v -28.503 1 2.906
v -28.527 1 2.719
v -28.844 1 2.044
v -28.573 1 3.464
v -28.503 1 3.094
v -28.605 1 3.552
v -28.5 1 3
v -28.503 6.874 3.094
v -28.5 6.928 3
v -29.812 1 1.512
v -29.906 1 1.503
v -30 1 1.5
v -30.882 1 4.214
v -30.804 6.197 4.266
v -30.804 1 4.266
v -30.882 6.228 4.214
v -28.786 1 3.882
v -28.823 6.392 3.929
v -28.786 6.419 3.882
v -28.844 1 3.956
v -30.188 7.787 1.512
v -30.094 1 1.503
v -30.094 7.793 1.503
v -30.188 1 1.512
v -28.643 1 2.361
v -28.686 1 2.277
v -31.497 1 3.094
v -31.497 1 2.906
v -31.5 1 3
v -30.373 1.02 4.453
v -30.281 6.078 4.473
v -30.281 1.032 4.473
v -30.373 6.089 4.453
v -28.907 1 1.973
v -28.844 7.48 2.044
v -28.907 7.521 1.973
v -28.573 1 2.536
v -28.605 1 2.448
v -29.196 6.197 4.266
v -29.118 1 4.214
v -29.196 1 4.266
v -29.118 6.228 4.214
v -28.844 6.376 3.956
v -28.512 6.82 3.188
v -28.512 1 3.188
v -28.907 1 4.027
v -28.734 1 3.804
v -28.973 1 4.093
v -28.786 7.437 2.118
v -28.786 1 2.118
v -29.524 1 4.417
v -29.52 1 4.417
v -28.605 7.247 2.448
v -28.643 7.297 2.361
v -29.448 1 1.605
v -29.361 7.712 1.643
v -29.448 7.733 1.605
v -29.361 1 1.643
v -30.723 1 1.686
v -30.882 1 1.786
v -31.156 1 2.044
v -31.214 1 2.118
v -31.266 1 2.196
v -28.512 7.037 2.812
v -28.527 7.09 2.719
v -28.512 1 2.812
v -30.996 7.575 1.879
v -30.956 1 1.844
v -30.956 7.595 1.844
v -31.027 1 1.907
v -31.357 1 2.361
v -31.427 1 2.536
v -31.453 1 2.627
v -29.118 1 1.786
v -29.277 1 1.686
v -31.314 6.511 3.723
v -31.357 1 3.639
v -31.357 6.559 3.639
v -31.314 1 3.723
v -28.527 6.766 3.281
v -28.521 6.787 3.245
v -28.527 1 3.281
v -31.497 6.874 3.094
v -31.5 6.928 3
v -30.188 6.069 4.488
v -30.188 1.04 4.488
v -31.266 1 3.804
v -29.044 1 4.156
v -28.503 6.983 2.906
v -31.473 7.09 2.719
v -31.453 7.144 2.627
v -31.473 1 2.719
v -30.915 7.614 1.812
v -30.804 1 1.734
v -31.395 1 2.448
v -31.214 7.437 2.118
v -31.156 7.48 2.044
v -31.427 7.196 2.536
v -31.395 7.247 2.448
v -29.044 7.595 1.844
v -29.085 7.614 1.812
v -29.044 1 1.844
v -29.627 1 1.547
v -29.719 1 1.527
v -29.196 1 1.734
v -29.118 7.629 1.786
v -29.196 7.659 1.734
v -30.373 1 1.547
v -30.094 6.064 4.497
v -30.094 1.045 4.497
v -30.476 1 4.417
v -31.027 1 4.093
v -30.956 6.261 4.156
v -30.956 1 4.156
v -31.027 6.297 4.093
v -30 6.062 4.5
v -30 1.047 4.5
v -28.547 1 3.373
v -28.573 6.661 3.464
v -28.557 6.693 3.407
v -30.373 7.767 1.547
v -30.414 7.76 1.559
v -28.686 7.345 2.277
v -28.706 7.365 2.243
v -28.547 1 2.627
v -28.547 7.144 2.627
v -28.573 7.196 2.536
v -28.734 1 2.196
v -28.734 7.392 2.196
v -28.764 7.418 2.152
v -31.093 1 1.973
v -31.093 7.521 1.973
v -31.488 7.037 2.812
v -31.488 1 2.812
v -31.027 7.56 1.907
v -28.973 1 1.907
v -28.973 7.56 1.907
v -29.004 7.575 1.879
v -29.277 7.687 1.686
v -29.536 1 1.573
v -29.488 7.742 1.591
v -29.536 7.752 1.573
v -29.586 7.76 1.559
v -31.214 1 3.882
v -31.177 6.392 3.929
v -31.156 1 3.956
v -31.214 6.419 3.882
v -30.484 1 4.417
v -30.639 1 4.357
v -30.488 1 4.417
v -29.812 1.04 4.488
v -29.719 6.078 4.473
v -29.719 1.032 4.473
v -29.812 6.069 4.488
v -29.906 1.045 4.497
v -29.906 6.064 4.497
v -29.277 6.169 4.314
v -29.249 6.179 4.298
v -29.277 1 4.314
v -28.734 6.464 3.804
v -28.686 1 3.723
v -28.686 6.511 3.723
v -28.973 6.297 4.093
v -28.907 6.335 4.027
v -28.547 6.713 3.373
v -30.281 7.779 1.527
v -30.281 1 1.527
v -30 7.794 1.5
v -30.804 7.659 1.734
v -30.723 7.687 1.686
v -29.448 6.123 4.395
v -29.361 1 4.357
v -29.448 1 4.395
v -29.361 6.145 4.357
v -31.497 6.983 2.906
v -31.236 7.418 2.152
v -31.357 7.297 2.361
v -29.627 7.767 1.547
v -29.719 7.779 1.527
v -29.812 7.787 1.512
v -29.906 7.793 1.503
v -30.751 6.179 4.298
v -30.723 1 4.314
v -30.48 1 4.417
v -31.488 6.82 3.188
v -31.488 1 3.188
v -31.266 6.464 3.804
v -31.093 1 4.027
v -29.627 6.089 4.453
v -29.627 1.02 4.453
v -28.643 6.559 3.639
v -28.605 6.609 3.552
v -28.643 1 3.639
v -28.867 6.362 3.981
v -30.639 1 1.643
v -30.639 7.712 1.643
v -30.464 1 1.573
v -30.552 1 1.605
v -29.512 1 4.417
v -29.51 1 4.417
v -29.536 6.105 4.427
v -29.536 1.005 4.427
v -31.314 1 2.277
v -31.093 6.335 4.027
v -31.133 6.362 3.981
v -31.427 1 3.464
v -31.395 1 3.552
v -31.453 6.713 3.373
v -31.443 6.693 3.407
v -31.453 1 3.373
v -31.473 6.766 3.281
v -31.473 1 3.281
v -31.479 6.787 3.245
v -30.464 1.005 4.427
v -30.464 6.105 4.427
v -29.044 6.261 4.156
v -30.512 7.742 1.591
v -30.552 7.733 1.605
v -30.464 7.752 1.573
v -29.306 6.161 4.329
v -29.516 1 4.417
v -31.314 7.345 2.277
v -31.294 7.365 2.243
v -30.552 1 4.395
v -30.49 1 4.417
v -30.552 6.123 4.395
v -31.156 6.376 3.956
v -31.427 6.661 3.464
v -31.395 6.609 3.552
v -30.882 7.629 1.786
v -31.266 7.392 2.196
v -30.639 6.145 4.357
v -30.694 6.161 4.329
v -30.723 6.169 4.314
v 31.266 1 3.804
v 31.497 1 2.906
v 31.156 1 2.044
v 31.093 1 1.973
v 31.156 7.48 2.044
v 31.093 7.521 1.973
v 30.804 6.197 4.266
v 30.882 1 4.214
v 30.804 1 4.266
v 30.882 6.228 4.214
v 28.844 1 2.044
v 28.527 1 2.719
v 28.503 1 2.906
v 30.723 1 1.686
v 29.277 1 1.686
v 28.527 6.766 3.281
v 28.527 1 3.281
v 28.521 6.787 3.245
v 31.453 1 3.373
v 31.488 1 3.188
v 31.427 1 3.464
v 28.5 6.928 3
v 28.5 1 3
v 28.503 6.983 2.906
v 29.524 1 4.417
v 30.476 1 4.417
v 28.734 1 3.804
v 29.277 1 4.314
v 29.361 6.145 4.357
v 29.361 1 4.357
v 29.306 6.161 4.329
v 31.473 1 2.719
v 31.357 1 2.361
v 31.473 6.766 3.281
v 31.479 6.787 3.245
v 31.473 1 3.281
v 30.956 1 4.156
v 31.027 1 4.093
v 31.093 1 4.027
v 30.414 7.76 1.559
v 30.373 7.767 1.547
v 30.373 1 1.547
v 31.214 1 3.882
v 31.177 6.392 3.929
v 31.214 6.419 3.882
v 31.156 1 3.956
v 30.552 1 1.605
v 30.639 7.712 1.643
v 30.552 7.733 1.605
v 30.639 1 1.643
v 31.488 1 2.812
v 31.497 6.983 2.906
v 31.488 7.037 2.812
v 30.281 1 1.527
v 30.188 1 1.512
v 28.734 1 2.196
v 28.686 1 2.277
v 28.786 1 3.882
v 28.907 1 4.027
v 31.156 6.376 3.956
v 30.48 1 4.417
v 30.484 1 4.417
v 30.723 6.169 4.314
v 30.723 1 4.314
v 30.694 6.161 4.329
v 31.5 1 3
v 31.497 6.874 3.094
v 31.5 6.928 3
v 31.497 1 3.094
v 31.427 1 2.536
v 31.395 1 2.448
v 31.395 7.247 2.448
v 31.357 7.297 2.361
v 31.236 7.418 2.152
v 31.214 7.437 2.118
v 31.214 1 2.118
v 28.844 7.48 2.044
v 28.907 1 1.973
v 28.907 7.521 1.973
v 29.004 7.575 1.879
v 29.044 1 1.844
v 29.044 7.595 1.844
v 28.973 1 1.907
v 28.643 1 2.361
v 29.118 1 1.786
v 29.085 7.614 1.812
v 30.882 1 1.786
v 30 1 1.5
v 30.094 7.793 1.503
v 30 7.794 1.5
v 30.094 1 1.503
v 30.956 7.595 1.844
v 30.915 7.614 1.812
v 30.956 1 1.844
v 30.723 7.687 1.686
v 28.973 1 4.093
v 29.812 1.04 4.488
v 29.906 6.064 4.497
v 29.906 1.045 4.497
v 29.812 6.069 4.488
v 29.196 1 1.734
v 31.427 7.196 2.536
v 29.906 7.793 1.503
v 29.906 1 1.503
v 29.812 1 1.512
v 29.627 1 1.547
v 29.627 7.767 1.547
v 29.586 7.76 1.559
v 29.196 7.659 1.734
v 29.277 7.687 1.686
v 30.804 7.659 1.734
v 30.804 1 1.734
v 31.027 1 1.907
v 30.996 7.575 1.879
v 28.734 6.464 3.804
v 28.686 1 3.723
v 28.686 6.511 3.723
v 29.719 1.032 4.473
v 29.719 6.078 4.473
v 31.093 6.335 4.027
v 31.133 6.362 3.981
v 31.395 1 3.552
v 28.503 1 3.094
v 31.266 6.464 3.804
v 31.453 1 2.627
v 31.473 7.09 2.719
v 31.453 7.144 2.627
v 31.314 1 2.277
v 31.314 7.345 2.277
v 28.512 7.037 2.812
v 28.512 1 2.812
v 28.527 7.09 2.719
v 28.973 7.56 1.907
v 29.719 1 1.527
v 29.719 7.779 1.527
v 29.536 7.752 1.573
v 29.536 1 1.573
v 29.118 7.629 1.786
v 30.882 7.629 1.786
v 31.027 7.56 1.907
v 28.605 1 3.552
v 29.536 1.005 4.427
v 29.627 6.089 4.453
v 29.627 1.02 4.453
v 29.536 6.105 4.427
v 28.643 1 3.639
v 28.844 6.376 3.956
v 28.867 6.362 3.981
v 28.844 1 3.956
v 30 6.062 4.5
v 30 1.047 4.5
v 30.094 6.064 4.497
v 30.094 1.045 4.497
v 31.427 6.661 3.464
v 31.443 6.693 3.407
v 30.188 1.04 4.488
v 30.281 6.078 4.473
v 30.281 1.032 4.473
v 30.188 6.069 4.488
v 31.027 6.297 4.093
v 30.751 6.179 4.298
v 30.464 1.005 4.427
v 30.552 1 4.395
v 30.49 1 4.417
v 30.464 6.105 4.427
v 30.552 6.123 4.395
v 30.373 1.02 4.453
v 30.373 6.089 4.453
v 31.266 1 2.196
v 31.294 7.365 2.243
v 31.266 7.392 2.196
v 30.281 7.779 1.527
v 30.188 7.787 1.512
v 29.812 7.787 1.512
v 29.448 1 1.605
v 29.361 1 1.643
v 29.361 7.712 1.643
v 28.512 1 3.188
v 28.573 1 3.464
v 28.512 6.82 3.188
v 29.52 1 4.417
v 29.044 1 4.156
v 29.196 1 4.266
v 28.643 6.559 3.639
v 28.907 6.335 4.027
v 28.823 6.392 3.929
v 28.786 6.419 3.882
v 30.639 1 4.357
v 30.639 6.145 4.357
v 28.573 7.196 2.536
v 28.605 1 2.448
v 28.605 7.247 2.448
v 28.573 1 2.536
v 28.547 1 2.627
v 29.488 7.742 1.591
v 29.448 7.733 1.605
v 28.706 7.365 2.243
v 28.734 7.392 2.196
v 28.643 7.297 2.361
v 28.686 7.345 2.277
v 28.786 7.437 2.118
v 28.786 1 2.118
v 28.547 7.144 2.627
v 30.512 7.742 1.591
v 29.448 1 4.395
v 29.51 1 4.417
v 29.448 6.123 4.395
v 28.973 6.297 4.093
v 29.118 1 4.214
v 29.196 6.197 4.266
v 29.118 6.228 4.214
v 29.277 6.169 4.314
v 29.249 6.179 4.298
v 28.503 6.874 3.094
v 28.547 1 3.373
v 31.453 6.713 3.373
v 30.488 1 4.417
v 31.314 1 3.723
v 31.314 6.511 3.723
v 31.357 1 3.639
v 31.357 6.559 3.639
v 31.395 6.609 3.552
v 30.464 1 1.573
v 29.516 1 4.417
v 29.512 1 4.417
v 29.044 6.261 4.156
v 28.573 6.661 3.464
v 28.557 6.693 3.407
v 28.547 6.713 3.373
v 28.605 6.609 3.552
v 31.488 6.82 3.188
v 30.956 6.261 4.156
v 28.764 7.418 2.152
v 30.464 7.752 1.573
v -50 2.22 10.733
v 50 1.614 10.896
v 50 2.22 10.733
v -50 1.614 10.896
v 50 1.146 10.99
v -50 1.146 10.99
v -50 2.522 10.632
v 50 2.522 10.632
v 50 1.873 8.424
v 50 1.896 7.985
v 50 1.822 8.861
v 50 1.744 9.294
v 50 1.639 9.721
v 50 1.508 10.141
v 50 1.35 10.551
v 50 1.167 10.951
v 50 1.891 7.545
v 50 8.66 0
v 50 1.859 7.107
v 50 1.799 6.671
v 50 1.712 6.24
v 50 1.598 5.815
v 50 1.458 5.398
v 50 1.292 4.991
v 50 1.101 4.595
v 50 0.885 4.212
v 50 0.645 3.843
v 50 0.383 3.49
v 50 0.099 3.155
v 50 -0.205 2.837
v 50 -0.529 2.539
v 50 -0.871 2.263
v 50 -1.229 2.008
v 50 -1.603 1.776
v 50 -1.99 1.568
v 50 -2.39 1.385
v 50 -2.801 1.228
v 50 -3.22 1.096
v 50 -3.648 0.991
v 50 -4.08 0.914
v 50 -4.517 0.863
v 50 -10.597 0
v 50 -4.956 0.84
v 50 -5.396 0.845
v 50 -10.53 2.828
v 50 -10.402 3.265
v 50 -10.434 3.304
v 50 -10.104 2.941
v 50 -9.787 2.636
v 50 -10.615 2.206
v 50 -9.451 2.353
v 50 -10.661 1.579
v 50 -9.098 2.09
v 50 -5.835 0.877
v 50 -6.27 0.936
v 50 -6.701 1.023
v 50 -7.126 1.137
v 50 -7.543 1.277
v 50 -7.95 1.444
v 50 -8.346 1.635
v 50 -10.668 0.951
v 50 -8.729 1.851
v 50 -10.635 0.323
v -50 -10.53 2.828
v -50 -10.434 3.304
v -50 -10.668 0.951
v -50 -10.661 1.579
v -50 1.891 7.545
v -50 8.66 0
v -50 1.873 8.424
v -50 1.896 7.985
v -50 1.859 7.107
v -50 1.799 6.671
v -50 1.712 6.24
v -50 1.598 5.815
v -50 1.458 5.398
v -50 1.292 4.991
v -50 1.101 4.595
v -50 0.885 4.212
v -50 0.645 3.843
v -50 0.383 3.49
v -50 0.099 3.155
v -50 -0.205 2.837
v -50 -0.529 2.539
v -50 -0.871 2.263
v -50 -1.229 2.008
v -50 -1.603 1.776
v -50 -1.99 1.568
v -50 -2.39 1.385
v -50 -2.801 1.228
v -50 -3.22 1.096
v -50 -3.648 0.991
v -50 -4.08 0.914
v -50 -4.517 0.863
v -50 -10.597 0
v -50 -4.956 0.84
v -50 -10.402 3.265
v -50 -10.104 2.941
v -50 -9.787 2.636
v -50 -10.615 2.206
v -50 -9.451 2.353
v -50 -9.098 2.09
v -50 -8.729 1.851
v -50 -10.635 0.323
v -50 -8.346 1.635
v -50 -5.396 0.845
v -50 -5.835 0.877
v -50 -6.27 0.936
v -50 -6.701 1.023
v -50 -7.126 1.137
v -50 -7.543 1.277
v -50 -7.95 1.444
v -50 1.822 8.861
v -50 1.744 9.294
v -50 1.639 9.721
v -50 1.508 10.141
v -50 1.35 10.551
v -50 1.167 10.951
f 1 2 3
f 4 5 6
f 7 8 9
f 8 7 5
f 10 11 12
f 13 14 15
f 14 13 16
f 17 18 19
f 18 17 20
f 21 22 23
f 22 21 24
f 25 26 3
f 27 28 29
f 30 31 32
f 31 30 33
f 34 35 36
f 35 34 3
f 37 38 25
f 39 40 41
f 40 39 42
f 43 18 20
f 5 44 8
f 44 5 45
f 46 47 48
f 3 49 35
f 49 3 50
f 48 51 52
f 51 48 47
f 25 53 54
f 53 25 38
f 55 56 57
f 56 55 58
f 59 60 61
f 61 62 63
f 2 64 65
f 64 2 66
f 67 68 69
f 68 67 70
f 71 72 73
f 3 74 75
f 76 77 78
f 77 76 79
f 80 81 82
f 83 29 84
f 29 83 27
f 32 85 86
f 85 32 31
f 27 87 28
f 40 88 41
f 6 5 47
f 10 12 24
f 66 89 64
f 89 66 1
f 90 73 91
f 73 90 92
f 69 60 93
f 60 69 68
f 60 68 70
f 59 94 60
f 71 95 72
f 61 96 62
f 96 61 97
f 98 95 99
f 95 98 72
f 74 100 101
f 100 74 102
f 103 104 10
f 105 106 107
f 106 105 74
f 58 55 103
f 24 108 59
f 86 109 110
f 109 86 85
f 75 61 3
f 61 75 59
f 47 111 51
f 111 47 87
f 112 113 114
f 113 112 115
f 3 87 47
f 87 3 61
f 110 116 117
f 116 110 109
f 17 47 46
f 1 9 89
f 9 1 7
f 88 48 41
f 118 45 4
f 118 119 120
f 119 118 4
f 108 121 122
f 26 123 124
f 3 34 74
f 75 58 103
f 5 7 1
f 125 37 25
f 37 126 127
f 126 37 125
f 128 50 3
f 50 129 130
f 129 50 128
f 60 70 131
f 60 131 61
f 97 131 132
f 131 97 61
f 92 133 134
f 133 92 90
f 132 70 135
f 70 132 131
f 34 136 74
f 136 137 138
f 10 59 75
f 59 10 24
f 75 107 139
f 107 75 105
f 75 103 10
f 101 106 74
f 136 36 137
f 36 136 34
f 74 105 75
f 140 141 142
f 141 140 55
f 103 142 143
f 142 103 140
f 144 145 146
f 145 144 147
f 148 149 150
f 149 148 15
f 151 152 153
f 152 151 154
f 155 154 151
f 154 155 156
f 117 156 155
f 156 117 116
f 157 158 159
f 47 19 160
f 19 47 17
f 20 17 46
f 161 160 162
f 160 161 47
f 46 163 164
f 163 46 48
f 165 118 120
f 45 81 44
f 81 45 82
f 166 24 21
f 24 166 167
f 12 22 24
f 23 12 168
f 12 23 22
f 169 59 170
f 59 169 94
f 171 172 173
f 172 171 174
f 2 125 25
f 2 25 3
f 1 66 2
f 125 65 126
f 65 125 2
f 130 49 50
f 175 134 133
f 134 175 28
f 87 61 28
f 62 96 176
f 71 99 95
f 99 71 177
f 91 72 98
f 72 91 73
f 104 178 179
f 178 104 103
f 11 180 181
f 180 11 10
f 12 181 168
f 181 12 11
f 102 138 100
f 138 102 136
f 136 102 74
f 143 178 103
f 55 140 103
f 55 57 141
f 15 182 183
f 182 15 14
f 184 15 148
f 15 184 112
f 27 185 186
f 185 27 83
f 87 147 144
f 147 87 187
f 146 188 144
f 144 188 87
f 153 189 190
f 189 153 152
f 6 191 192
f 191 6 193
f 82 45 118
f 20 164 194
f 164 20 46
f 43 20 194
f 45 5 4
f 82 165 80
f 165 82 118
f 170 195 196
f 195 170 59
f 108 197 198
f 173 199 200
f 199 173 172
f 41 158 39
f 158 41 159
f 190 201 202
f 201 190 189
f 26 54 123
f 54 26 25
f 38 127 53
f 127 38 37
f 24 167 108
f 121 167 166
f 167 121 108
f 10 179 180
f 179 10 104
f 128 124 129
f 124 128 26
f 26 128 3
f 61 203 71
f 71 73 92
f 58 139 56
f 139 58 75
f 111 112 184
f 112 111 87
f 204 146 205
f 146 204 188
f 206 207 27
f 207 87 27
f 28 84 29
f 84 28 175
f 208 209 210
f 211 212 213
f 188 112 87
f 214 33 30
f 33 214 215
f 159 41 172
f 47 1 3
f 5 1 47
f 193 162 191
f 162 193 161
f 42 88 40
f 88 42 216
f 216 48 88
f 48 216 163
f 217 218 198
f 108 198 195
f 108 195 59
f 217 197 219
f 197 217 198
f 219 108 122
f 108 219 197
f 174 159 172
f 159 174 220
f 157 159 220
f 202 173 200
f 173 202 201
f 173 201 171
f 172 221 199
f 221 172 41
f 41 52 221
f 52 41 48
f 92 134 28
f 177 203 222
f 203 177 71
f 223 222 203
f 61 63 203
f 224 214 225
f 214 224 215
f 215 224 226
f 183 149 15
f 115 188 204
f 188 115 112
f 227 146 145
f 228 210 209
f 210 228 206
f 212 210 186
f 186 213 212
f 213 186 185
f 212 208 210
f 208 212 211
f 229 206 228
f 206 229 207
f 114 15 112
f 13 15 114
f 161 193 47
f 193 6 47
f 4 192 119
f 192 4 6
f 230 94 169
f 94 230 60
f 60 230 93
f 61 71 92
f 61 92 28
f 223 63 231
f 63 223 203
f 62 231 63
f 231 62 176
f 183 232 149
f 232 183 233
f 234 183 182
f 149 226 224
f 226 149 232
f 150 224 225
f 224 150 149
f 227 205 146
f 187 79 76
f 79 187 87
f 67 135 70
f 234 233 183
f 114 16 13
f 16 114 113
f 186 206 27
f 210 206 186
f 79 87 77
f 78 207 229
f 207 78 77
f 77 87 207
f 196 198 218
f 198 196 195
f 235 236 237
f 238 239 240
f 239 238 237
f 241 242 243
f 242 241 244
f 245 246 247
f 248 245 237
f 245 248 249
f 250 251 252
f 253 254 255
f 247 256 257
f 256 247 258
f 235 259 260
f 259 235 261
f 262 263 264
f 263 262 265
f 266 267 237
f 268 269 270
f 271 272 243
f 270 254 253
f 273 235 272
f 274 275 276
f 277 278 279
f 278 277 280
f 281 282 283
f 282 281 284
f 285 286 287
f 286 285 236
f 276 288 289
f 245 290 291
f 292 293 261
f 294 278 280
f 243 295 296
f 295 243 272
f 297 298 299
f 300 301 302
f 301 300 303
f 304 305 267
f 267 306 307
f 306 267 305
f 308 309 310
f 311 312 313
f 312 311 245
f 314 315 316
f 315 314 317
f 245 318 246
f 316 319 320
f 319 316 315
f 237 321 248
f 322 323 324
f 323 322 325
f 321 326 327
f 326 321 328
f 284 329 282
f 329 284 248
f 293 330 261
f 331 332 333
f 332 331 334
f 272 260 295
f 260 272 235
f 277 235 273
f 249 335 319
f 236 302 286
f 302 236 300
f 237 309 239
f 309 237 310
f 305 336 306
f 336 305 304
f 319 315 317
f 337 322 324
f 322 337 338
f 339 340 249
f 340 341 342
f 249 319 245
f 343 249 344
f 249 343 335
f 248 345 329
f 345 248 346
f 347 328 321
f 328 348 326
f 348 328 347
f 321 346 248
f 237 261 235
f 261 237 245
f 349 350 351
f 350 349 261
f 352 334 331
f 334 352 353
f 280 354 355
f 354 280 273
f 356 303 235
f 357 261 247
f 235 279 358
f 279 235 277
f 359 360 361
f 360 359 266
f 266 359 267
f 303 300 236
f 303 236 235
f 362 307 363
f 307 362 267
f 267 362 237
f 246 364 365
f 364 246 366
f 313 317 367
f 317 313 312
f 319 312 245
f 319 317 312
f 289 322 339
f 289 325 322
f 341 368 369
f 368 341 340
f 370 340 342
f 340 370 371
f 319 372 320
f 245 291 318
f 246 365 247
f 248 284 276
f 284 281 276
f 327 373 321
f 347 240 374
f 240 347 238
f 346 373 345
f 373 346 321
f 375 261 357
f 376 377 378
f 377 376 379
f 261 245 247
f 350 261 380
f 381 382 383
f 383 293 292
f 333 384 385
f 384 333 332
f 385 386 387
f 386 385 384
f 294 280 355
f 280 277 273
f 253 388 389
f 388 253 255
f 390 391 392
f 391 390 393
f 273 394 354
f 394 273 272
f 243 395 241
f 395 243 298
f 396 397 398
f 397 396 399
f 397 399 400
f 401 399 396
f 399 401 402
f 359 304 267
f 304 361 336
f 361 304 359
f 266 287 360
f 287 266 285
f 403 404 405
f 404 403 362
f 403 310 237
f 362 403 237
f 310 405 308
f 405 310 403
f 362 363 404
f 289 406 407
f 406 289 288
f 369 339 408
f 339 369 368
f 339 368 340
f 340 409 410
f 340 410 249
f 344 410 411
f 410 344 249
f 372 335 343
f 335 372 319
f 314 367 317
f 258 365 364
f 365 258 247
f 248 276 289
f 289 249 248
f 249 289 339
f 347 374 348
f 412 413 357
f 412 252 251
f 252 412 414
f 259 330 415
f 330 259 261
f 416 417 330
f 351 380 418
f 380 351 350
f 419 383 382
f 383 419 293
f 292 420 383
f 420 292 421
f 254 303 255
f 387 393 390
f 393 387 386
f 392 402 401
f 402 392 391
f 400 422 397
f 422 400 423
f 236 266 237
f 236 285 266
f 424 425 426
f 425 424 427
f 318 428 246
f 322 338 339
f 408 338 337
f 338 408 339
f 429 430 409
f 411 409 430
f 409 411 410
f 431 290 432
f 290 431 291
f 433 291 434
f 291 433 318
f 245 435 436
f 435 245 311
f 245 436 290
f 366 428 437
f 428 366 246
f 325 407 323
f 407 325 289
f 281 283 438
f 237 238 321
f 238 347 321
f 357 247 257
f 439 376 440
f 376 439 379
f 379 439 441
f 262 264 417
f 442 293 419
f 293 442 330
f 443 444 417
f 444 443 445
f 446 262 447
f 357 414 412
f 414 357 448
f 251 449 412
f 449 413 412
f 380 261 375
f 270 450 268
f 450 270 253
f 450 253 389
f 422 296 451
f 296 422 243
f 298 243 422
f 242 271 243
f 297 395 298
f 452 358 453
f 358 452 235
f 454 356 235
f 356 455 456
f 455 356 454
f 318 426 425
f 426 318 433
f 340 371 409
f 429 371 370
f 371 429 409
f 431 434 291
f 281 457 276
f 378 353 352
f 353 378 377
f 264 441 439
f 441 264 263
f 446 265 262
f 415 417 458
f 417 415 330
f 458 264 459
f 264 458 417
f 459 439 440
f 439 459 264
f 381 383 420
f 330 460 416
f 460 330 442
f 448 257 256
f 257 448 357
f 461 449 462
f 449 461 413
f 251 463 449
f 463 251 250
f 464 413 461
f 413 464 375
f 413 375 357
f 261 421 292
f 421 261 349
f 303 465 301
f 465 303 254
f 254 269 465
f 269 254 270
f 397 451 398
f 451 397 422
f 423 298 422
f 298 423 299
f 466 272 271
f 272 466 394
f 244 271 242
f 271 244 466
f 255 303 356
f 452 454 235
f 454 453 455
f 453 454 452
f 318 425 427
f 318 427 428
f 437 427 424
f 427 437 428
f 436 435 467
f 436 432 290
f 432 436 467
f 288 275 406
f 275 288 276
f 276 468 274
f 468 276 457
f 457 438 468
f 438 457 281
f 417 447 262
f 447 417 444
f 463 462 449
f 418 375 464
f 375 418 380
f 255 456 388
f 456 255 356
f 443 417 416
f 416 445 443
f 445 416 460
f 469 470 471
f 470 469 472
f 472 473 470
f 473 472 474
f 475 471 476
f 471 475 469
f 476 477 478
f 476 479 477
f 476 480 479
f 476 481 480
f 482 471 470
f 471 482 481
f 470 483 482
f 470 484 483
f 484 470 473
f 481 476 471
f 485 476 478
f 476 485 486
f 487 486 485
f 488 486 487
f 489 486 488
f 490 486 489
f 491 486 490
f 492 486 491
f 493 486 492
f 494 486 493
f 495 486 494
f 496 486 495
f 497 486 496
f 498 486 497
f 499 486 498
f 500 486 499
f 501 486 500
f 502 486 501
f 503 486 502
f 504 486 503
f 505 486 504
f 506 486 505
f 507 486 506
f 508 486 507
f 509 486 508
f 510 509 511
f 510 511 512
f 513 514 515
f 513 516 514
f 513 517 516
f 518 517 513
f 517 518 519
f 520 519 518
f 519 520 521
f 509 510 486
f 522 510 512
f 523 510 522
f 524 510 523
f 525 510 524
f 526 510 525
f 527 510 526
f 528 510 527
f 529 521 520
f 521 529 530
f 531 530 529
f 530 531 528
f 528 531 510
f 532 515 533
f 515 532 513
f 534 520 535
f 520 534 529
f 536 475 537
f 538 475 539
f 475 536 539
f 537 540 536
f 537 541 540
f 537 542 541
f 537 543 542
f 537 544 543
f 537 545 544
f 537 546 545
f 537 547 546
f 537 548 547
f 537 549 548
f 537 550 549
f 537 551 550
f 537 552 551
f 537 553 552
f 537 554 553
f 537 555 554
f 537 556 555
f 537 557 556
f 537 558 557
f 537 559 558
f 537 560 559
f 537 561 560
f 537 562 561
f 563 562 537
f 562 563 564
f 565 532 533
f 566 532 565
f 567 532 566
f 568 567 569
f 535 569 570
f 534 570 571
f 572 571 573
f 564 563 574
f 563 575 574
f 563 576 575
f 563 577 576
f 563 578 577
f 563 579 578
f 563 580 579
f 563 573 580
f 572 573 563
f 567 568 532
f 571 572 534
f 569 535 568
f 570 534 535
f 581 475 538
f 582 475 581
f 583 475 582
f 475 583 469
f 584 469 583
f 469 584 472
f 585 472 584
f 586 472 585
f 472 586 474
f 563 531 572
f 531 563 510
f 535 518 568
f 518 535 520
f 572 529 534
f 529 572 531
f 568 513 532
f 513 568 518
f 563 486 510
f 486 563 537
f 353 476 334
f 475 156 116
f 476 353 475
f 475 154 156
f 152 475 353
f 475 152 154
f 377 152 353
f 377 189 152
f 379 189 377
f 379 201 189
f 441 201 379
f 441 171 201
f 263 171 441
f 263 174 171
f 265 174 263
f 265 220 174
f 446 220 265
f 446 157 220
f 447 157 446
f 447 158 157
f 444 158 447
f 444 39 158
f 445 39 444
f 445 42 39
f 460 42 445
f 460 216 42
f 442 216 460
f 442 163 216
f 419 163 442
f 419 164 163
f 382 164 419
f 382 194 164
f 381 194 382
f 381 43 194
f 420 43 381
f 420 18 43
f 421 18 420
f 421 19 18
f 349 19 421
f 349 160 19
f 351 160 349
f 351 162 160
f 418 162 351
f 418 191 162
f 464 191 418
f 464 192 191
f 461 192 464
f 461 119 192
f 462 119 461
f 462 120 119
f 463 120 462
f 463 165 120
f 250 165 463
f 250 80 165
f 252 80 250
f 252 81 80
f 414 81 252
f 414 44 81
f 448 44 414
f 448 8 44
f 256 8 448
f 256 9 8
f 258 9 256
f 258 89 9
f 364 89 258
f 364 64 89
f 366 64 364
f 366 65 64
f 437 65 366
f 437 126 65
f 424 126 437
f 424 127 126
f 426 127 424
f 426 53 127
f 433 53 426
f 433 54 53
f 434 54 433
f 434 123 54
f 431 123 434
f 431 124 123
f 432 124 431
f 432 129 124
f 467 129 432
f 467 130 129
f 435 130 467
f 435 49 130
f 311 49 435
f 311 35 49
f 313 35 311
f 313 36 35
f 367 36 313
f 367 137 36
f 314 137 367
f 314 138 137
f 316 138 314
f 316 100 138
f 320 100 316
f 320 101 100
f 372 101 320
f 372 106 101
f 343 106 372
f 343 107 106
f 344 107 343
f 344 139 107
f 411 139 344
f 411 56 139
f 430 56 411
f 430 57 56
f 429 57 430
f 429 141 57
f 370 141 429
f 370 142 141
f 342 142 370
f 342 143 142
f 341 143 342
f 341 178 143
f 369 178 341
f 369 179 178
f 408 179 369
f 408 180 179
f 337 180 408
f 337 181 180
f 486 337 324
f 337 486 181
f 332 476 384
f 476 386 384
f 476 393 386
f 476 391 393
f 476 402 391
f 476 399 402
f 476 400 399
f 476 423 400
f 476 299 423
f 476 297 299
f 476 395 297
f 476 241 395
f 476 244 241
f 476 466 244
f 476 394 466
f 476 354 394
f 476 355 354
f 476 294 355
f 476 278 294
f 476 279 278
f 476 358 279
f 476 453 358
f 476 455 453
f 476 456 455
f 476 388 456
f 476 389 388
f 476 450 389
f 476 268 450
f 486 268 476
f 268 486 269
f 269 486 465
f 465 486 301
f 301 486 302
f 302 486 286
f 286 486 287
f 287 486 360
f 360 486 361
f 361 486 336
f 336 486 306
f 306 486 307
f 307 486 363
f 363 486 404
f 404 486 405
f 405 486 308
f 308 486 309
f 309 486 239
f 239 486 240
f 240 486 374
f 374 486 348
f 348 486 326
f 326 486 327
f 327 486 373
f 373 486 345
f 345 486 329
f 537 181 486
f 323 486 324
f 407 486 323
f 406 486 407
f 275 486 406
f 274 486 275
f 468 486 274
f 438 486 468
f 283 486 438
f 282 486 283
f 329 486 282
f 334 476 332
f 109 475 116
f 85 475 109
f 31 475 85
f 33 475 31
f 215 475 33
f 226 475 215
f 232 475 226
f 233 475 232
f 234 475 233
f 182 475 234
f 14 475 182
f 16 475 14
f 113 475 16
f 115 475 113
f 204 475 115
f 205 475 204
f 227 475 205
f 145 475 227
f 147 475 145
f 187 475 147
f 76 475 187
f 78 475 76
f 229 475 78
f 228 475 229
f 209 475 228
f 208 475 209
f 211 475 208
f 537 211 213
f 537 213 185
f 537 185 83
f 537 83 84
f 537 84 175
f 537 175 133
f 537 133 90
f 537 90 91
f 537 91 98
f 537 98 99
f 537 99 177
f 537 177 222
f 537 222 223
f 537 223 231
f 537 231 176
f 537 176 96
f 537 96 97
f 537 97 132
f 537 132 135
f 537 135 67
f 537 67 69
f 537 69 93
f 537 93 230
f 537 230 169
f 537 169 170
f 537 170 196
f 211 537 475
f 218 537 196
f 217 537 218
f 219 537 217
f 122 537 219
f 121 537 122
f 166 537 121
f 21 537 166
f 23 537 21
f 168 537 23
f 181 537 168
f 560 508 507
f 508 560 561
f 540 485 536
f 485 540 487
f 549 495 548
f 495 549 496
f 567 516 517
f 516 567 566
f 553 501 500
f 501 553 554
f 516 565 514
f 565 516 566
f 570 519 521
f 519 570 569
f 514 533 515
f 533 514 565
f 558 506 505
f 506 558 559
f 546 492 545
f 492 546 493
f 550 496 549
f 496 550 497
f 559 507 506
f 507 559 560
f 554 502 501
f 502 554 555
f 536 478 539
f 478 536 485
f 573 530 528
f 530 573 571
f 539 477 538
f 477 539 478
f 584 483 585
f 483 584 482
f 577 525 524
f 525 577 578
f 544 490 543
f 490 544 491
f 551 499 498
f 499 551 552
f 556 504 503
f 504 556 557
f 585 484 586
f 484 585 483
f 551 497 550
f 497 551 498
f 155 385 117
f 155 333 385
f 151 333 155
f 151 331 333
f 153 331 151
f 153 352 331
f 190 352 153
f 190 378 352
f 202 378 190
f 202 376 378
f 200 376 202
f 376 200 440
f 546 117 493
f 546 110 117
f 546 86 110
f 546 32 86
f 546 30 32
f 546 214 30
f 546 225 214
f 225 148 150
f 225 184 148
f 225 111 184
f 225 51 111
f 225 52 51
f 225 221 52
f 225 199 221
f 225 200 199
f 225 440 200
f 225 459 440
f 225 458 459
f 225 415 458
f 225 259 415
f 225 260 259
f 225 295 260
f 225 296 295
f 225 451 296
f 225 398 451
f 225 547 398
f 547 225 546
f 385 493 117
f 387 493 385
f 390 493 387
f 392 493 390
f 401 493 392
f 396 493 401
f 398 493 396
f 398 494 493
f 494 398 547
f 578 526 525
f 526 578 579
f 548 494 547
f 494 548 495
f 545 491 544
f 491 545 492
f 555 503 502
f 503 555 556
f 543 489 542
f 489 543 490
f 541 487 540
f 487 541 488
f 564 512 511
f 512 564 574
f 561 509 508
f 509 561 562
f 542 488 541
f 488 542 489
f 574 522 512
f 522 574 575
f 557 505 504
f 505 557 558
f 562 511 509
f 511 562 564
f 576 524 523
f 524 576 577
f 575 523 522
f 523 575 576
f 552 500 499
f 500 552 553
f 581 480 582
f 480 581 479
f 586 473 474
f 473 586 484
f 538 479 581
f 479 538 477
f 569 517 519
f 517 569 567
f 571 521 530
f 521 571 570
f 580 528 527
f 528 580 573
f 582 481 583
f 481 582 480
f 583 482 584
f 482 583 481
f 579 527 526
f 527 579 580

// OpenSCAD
//http://www.thingiverse.com/thing:56236
//by mattjoyce
//customized by Arvin Evans

//length of trough
l1=100;
//magnet radius given as diameter measure. ( /2 in code)
mr=6.25;
//magnet hole depth
md=2;
//outside diameter of cylinder to subtract from and give nice round edges
od=10;
//My additions to mattjoyce's code
withMagnets="no";//[yes:Magnets,no:Pins,other:both]

pinDia=3;//filament pins to attach to a non-magnetic back plate
pinHoleDepth=5;
pinLength=15;

//Pins at the same angle as the back or horizontal to build platform?
perpendicular="false";//[true:90 degrees to back,false:parallel to bottom]
backAngle=60;
placeOnBuildPlatform="true";//[true:Flat to build platform,false:As the Original]

$fn=100;

module track(){
	difference(){
		rotate([0,90,0]) translate([-od,od/2,0]) 
		cylinder(r=od,h=l1);// gives nice round edges
		rotate([backAngle,0,0]) translate([-1,-od,-od]) 
		cube([l1+2,od*2,od*3]);// flattens the bottom
		translate([-1,od+2.5,0]) 
		cube([l1+2,od*2,od*3]);// flattens the back
		rotate([0,90,0]) translate([-18,4.5,-1]) 
		cylinder(r=7,h=l1+2); // the marble trough
	
		if(withMagnets=="yes" || withMagnets=="other"){
			rotate([90,0,0]) translate([l1/5,mr*2,-15+md])// 1/5
			cylinder(r=mr/2,h=md);// (back) magnet hole1
			rotate([90,0,0]) translate([l1/5*2.5,mr*1.5,-15+md])// 2.5/5=1/2 
			cylinder(r=mr/2,h=md);// (middle) magnet hole2
			rotate([90,0,0]) translate([l1/5*4,mr*2,-15+md])// 4/5 
			cylinder(r=mr/2,h=md);// (front) magnet hole3
		}
		if(withMagnets=="no" || withMagnets=="other"){
			if(perpendicular=="true"){// 90 degrees
				rotate([90,0,0]) 
				translate([l1/5,od,-pinLength-pinHoleDepth-1])
#				cylinder(r=pinDia/2,h=pinLength);
			
				rotate([90,0,0]) 
				translate([l1/5*4,od,-pinLength-pinHoleDepth-1]) 
#				cylinder(r=pinDia/2,h=pinLength);

			}else{//angled at backAngle degrees
				rotate([backAngle,0,0]) 
				translate([l1/5,od+pinDia,-pinLength-1])
#				cylinder(r=pinDia/2,h=pinLength);
			
				rotate([backAngle,0,0]) 
				translate([l1/5*4,od+pinDia,-pinLength-1]) 
#				cylinder(r=pinDia/2,h=pinLength);
			}
		}
	}
}

module main(){
  if(placeOnBuildPlatform=="true"){
	translate([-l1/2,0,-od])// move down to platform
	rotate([90-backAngle,0,0])// put the base flat to platform
	track();
  } else {
	track();
  }
}

main();
